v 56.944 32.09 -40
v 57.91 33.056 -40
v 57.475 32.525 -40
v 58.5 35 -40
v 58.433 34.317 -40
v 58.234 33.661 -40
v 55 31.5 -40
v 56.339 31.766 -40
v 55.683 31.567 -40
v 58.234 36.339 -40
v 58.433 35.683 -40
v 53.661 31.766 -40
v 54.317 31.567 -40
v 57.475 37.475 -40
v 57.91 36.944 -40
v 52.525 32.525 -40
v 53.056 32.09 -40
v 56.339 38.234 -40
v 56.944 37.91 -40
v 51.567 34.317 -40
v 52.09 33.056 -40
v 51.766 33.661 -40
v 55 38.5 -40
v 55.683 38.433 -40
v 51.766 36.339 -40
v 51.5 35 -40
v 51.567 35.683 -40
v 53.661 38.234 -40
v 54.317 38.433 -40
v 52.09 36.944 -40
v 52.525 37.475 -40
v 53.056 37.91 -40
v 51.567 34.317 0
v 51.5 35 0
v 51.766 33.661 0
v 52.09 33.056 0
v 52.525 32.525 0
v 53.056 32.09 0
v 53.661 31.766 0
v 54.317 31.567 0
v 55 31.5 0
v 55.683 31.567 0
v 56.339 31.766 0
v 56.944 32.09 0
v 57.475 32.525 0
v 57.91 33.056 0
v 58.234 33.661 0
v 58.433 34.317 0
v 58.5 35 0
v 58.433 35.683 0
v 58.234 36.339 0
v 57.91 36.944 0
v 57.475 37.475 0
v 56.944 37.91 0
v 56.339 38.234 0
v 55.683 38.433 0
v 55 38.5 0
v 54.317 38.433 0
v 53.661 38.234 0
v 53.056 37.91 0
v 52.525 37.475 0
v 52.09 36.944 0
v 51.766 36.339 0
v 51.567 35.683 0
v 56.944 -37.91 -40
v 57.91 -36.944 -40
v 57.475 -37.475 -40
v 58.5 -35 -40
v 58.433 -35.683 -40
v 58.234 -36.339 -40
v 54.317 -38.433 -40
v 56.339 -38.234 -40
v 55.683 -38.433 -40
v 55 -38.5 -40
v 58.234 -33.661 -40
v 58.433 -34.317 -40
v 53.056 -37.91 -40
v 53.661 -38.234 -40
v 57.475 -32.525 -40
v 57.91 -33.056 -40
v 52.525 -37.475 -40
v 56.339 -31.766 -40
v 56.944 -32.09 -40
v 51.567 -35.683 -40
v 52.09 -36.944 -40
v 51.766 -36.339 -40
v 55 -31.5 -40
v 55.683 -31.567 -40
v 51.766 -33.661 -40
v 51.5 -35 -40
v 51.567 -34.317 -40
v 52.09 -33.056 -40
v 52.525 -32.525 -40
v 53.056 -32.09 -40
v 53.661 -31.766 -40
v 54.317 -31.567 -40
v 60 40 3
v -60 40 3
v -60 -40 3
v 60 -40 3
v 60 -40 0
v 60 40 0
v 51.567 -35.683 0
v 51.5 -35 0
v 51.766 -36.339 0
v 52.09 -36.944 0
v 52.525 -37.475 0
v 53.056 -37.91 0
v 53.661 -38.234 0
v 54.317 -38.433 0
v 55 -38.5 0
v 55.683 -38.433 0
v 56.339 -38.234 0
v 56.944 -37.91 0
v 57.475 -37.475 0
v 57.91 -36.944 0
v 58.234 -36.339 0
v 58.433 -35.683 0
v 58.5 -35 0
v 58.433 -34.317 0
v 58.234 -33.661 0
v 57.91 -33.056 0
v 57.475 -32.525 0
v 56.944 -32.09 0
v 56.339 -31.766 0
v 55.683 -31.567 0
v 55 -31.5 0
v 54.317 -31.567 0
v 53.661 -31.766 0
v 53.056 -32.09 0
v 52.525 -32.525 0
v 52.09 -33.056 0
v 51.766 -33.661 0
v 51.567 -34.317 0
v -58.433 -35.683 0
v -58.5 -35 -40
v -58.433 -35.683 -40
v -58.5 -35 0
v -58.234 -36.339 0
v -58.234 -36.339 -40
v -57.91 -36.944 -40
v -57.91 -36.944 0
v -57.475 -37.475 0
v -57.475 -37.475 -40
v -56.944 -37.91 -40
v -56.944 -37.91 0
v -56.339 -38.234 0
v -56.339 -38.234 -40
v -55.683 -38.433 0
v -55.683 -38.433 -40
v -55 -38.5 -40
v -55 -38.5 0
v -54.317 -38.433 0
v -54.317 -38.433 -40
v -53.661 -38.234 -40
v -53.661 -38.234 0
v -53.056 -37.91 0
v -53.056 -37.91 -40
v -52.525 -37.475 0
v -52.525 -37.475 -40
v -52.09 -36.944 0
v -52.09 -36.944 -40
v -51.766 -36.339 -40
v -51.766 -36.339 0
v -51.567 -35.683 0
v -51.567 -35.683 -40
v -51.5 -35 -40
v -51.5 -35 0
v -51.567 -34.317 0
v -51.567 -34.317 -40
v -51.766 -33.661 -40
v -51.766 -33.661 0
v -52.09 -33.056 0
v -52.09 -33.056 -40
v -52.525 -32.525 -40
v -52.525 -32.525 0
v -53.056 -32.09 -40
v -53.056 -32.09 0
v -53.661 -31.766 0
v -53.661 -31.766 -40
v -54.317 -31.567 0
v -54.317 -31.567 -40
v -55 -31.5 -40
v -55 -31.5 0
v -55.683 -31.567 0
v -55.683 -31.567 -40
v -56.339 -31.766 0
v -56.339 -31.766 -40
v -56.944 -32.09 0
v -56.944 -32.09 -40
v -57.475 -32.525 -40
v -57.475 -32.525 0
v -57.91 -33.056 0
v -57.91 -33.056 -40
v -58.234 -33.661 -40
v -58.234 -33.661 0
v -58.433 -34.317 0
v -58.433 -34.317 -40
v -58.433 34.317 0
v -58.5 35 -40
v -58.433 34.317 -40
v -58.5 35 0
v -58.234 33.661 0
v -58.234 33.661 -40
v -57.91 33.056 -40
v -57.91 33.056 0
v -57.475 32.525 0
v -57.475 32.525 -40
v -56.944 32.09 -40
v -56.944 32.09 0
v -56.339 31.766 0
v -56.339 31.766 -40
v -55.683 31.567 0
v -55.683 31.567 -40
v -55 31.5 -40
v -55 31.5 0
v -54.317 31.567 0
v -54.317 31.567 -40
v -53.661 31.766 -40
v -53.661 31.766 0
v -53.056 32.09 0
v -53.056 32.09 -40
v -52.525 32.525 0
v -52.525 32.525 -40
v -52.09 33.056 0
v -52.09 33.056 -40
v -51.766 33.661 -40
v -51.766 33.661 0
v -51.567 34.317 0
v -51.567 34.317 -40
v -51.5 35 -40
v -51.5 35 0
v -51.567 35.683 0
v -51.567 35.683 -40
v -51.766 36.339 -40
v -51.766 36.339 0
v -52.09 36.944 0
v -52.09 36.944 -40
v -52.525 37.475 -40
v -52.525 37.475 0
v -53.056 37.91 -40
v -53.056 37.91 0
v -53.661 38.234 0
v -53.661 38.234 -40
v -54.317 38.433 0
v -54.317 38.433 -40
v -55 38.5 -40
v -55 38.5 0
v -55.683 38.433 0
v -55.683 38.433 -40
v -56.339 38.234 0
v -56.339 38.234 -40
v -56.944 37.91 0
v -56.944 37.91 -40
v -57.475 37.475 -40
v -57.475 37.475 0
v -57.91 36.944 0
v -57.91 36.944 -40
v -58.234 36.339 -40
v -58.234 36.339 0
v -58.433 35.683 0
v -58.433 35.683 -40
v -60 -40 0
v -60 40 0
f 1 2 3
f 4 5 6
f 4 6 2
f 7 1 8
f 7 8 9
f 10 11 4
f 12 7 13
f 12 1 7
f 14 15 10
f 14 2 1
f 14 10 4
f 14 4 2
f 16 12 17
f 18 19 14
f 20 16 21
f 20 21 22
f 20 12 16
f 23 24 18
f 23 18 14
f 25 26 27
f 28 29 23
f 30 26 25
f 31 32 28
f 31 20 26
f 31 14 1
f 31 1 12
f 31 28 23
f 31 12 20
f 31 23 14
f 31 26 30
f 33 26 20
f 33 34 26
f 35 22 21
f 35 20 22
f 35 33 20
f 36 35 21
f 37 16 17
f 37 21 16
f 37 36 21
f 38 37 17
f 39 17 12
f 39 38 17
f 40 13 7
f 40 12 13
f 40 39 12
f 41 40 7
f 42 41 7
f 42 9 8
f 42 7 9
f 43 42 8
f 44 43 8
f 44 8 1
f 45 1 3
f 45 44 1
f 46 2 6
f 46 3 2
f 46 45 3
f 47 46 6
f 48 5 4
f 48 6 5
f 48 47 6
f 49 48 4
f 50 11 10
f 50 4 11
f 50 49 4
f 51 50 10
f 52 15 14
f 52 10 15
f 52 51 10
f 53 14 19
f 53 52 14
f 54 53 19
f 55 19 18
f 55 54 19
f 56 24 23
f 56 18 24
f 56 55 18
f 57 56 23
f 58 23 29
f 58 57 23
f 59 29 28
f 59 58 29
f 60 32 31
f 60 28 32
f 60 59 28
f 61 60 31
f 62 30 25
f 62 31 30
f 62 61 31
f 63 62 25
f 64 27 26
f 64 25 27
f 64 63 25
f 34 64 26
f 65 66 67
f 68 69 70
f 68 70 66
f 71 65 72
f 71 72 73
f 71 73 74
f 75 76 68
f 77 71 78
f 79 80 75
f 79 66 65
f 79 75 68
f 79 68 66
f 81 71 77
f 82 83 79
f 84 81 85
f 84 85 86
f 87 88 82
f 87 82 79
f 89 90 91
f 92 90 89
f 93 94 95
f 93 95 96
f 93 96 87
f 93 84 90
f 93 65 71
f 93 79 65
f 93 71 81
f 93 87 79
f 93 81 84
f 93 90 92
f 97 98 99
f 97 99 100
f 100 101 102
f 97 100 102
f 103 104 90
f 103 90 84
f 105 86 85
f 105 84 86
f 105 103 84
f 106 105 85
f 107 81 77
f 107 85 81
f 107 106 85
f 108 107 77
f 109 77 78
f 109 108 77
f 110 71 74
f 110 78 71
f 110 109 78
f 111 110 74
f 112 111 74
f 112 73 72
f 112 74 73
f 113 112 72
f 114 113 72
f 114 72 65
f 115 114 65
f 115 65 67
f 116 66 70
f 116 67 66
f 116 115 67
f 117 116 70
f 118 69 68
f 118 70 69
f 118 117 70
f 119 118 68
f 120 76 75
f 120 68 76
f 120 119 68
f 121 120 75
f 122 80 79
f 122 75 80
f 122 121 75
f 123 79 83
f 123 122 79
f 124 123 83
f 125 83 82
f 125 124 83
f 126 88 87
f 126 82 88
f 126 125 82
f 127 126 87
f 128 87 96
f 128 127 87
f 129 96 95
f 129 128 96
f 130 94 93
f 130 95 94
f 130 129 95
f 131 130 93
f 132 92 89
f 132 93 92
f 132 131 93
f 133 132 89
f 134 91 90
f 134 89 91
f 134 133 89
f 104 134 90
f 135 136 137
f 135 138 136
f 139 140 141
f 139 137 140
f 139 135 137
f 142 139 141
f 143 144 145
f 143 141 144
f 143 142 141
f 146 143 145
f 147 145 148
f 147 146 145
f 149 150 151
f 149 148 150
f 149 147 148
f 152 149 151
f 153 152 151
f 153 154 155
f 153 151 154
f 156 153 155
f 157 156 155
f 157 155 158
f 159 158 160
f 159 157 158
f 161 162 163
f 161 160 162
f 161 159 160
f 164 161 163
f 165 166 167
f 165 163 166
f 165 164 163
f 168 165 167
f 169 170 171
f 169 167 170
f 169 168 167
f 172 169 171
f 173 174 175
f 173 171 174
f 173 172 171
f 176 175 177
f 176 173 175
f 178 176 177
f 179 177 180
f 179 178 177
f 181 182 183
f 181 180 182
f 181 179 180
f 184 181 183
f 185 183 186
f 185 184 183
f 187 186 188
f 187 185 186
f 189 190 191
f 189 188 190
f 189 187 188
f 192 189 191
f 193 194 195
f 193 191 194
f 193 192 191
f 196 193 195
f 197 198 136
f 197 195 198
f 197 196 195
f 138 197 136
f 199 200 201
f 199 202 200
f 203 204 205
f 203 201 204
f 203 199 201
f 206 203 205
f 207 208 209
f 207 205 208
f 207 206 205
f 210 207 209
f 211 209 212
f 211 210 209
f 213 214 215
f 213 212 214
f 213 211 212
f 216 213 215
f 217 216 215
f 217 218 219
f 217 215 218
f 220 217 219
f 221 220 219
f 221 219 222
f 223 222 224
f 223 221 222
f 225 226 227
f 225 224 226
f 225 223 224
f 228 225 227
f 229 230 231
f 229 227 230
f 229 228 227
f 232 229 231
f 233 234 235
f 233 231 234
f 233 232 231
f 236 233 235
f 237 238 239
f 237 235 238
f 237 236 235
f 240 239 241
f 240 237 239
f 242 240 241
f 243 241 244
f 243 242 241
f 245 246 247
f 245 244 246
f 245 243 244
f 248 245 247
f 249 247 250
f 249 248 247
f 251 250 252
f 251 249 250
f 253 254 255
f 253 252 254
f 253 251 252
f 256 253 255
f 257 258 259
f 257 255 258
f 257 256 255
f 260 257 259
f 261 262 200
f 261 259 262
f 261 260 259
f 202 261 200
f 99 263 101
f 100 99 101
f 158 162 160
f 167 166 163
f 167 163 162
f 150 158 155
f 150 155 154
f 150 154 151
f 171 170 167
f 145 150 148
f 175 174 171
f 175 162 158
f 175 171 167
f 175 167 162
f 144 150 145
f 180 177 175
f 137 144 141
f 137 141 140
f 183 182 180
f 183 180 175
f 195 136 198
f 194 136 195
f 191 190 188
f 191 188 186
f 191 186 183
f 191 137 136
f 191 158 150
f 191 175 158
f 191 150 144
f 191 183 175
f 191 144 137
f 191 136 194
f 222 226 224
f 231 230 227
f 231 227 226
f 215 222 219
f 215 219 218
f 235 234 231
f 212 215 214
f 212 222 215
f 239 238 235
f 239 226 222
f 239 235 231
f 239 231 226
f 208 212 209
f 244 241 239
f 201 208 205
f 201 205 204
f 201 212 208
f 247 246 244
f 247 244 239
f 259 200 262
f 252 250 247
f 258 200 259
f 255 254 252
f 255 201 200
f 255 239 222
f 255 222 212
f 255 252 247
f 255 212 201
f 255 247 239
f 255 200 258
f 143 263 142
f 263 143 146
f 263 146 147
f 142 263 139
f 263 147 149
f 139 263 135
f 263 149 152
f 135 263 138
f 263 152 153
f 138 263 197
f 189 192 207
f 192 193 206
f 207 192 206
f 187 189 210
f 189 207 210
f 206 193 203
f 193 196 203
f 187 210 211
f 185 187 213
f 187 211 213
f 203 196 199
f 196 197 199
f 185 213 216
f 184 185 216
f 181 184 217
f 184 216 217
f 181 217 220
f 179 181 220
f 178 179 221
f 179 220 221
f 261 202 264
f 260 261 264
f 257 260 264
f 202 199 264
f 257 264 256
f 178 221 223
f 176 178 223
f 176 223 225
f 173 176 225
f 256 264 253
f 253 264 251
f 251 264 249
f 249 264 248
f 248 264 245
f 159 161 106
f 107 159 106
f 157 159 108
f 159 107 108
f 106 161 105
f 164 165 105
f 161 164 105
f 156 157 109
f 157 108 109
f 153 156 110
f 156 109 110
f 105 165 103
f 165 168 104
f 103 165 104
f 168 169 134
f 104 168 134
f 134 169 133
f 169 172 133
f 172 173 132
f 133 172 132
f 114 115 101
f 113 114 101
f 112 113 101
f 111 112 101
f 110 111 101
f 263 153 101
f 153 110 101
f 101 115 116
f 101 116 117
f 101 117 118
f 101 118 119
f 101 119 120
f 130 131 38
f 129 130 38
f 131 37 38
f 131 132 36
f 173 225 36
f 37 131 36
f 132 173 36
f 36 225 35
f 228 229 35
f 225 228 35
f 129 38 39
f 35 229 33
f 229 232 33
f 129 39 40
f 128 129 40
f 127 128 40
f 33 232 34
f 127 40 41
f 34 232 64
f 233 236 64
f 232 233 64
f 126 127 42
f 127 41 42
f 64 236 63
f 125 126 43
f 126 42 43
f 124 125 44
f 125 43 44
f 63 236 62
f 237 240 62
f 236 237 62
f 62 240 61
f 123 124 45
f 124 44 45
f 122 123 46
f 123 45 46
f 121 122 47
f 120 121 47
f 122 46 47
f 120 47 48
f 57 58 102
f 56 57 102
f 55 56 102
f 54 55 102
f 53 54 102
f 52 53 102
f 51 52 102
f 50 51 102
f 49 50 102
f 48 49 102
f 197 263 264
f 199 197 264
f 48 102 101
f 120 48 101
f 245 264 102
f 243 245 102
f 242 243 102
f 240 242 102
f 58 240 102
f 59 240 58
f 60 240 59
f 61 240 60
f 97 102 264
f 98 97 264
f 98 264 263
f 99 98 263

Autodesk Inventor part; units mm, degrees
ref_plane "YZ Plane" through (0, 0, 0) normal (1, 0, 0) x (0, 1, 0)
ref_plane "XZ Plane" through (0, 0, 0) normal (0, 1, 0) x (-1, 0, 0)
ref_plane "XY Plane" through (0, 0, 0) normal (0, 0, 1) x (1, 0, 0)
sketch "Sketch1" plane through (0, 0, 0) normal (0, 0, 1) x (1, 0, 0)
  line L0 (-50, -30) -> (50, -30) construction
  line L1 (50, -30) -> (50, 30) construction
  line L2 (50, 30) -> (-50, 30) construction
  line L3 (-50, 30) -> (-50, -30) construction
  line L4 (-50, -30) -> (50, 30) construction
  line L5 (50, -30) -> (-50, 30) construction
  line L6 (-60, -40) -> (60, -40)
  line L7 (60, -40) -> (60, 40)
  line L8 (60, 40) -> (-60, 40)
  line L9 (-60, 40) -> (-60, -40)
  line L10 (-60, -40) -> (60, 40)
  line L11 (60, -40) -> (-60, 40)
  point P0 (0, 0)
  dimension "d0" = 60
  dimension "d1" = 100
  dimension "d2" = 10
  dimension "d3" = 10
extrude "Extrusion1" add sketch "Sketch1" along normal blind 3
sketch "Sketch2" plane through (0, 0, 0) normal (0, 0, -1) x (-1, 0, 0)
  line L0 (50, -30) -> (50, 30) construction
  line L1 (50, 30) -> (-50, 30) construction
  line L2 (-50, 30) -> (-50, -30) construction
  line L3 (-50, -30) -> (50, -30) construction
  line L4 (50, -30) -> (-50, 30) construction
  line L5 (50, 30) -> (-50, -30) construction
  line L6 (60, -40) -> (-60, -40) construction
  line L7 (-50, -30) -> (-60, -30) construction
  line L8 (-60, -30) -> (-60, -40) construction
  line L9 (-60, -40) -> (-50, -40) construction
  line L10 (-50, -40) -> (-50, -30) construction
  line L11 (-60, 40) -> (60, 40) construction
  line L12 (-50, 30) -> (-60, 30) construction
  line L13 (-60, 30) -> (-60, 40) construction
  line L14 (-60, 40) -> (-50, 40) construction
  line L15 (-50, 40) -> (-50, 30) construction
  line L16 (50, 30) -> (60, 30) construction
  line L17 (60, 30) -> (60, 40) construction
  line L18 (60, 40) -> (50, 40) construction
  line L19 (50, 40) -> (50, 30) construction
  line L20 (60, 40) -> (60, -40) construction
  line L21 (60, -40) -> (50, -40) construction
  line L22 (50, -40) -> (50, -30) construction
  line L23 (50, -30) -> (60, -30) construction
  line L24 (60, -30) -> (60, -40) construction
  circle A0 centre (-55, -35) radius 3.5
  circle A1 centre (-55, 35) radius 3.5
  circle A2 centre (55, -35) radius 3.5
  circle A3 centre (55, 35) radius 3.5
  line L25 (-55, -35) -> (55, -35) construction
  line L26 (55, -35) -> (55, 35) construction
  line L27 (55, 35) -> (-55, 35) construction
  line L28 (-55, 35) -> (-55, -35) construction
  line L29 (-55, -35) -> (55, 35) construction
  line L30 (55, -35) -> (-55, 35) construction
  line L31 (-60, -40) -> (-60, 40) construction
  point P0 (0, 0)
  dimension "d6" = 60
  dimension "d7" = 100
  dimension "d8" = 7
  dimension "d9" = 7
  dimension "d10" = 7
  dimension "d11" = 7
  dimension "d12" = 5
  dimension "d13" = 5
extrude "Extrusion2" add sketch "Sketch2" along normal blind 40
equation "\"d3\" = d2"
equation "\"d6\" = d0"
equation "\"d7\" = d1"
equation "\"d12\" = 0.5 * d2"
equation "\"d13\" = d12"
properties part number "table top"
